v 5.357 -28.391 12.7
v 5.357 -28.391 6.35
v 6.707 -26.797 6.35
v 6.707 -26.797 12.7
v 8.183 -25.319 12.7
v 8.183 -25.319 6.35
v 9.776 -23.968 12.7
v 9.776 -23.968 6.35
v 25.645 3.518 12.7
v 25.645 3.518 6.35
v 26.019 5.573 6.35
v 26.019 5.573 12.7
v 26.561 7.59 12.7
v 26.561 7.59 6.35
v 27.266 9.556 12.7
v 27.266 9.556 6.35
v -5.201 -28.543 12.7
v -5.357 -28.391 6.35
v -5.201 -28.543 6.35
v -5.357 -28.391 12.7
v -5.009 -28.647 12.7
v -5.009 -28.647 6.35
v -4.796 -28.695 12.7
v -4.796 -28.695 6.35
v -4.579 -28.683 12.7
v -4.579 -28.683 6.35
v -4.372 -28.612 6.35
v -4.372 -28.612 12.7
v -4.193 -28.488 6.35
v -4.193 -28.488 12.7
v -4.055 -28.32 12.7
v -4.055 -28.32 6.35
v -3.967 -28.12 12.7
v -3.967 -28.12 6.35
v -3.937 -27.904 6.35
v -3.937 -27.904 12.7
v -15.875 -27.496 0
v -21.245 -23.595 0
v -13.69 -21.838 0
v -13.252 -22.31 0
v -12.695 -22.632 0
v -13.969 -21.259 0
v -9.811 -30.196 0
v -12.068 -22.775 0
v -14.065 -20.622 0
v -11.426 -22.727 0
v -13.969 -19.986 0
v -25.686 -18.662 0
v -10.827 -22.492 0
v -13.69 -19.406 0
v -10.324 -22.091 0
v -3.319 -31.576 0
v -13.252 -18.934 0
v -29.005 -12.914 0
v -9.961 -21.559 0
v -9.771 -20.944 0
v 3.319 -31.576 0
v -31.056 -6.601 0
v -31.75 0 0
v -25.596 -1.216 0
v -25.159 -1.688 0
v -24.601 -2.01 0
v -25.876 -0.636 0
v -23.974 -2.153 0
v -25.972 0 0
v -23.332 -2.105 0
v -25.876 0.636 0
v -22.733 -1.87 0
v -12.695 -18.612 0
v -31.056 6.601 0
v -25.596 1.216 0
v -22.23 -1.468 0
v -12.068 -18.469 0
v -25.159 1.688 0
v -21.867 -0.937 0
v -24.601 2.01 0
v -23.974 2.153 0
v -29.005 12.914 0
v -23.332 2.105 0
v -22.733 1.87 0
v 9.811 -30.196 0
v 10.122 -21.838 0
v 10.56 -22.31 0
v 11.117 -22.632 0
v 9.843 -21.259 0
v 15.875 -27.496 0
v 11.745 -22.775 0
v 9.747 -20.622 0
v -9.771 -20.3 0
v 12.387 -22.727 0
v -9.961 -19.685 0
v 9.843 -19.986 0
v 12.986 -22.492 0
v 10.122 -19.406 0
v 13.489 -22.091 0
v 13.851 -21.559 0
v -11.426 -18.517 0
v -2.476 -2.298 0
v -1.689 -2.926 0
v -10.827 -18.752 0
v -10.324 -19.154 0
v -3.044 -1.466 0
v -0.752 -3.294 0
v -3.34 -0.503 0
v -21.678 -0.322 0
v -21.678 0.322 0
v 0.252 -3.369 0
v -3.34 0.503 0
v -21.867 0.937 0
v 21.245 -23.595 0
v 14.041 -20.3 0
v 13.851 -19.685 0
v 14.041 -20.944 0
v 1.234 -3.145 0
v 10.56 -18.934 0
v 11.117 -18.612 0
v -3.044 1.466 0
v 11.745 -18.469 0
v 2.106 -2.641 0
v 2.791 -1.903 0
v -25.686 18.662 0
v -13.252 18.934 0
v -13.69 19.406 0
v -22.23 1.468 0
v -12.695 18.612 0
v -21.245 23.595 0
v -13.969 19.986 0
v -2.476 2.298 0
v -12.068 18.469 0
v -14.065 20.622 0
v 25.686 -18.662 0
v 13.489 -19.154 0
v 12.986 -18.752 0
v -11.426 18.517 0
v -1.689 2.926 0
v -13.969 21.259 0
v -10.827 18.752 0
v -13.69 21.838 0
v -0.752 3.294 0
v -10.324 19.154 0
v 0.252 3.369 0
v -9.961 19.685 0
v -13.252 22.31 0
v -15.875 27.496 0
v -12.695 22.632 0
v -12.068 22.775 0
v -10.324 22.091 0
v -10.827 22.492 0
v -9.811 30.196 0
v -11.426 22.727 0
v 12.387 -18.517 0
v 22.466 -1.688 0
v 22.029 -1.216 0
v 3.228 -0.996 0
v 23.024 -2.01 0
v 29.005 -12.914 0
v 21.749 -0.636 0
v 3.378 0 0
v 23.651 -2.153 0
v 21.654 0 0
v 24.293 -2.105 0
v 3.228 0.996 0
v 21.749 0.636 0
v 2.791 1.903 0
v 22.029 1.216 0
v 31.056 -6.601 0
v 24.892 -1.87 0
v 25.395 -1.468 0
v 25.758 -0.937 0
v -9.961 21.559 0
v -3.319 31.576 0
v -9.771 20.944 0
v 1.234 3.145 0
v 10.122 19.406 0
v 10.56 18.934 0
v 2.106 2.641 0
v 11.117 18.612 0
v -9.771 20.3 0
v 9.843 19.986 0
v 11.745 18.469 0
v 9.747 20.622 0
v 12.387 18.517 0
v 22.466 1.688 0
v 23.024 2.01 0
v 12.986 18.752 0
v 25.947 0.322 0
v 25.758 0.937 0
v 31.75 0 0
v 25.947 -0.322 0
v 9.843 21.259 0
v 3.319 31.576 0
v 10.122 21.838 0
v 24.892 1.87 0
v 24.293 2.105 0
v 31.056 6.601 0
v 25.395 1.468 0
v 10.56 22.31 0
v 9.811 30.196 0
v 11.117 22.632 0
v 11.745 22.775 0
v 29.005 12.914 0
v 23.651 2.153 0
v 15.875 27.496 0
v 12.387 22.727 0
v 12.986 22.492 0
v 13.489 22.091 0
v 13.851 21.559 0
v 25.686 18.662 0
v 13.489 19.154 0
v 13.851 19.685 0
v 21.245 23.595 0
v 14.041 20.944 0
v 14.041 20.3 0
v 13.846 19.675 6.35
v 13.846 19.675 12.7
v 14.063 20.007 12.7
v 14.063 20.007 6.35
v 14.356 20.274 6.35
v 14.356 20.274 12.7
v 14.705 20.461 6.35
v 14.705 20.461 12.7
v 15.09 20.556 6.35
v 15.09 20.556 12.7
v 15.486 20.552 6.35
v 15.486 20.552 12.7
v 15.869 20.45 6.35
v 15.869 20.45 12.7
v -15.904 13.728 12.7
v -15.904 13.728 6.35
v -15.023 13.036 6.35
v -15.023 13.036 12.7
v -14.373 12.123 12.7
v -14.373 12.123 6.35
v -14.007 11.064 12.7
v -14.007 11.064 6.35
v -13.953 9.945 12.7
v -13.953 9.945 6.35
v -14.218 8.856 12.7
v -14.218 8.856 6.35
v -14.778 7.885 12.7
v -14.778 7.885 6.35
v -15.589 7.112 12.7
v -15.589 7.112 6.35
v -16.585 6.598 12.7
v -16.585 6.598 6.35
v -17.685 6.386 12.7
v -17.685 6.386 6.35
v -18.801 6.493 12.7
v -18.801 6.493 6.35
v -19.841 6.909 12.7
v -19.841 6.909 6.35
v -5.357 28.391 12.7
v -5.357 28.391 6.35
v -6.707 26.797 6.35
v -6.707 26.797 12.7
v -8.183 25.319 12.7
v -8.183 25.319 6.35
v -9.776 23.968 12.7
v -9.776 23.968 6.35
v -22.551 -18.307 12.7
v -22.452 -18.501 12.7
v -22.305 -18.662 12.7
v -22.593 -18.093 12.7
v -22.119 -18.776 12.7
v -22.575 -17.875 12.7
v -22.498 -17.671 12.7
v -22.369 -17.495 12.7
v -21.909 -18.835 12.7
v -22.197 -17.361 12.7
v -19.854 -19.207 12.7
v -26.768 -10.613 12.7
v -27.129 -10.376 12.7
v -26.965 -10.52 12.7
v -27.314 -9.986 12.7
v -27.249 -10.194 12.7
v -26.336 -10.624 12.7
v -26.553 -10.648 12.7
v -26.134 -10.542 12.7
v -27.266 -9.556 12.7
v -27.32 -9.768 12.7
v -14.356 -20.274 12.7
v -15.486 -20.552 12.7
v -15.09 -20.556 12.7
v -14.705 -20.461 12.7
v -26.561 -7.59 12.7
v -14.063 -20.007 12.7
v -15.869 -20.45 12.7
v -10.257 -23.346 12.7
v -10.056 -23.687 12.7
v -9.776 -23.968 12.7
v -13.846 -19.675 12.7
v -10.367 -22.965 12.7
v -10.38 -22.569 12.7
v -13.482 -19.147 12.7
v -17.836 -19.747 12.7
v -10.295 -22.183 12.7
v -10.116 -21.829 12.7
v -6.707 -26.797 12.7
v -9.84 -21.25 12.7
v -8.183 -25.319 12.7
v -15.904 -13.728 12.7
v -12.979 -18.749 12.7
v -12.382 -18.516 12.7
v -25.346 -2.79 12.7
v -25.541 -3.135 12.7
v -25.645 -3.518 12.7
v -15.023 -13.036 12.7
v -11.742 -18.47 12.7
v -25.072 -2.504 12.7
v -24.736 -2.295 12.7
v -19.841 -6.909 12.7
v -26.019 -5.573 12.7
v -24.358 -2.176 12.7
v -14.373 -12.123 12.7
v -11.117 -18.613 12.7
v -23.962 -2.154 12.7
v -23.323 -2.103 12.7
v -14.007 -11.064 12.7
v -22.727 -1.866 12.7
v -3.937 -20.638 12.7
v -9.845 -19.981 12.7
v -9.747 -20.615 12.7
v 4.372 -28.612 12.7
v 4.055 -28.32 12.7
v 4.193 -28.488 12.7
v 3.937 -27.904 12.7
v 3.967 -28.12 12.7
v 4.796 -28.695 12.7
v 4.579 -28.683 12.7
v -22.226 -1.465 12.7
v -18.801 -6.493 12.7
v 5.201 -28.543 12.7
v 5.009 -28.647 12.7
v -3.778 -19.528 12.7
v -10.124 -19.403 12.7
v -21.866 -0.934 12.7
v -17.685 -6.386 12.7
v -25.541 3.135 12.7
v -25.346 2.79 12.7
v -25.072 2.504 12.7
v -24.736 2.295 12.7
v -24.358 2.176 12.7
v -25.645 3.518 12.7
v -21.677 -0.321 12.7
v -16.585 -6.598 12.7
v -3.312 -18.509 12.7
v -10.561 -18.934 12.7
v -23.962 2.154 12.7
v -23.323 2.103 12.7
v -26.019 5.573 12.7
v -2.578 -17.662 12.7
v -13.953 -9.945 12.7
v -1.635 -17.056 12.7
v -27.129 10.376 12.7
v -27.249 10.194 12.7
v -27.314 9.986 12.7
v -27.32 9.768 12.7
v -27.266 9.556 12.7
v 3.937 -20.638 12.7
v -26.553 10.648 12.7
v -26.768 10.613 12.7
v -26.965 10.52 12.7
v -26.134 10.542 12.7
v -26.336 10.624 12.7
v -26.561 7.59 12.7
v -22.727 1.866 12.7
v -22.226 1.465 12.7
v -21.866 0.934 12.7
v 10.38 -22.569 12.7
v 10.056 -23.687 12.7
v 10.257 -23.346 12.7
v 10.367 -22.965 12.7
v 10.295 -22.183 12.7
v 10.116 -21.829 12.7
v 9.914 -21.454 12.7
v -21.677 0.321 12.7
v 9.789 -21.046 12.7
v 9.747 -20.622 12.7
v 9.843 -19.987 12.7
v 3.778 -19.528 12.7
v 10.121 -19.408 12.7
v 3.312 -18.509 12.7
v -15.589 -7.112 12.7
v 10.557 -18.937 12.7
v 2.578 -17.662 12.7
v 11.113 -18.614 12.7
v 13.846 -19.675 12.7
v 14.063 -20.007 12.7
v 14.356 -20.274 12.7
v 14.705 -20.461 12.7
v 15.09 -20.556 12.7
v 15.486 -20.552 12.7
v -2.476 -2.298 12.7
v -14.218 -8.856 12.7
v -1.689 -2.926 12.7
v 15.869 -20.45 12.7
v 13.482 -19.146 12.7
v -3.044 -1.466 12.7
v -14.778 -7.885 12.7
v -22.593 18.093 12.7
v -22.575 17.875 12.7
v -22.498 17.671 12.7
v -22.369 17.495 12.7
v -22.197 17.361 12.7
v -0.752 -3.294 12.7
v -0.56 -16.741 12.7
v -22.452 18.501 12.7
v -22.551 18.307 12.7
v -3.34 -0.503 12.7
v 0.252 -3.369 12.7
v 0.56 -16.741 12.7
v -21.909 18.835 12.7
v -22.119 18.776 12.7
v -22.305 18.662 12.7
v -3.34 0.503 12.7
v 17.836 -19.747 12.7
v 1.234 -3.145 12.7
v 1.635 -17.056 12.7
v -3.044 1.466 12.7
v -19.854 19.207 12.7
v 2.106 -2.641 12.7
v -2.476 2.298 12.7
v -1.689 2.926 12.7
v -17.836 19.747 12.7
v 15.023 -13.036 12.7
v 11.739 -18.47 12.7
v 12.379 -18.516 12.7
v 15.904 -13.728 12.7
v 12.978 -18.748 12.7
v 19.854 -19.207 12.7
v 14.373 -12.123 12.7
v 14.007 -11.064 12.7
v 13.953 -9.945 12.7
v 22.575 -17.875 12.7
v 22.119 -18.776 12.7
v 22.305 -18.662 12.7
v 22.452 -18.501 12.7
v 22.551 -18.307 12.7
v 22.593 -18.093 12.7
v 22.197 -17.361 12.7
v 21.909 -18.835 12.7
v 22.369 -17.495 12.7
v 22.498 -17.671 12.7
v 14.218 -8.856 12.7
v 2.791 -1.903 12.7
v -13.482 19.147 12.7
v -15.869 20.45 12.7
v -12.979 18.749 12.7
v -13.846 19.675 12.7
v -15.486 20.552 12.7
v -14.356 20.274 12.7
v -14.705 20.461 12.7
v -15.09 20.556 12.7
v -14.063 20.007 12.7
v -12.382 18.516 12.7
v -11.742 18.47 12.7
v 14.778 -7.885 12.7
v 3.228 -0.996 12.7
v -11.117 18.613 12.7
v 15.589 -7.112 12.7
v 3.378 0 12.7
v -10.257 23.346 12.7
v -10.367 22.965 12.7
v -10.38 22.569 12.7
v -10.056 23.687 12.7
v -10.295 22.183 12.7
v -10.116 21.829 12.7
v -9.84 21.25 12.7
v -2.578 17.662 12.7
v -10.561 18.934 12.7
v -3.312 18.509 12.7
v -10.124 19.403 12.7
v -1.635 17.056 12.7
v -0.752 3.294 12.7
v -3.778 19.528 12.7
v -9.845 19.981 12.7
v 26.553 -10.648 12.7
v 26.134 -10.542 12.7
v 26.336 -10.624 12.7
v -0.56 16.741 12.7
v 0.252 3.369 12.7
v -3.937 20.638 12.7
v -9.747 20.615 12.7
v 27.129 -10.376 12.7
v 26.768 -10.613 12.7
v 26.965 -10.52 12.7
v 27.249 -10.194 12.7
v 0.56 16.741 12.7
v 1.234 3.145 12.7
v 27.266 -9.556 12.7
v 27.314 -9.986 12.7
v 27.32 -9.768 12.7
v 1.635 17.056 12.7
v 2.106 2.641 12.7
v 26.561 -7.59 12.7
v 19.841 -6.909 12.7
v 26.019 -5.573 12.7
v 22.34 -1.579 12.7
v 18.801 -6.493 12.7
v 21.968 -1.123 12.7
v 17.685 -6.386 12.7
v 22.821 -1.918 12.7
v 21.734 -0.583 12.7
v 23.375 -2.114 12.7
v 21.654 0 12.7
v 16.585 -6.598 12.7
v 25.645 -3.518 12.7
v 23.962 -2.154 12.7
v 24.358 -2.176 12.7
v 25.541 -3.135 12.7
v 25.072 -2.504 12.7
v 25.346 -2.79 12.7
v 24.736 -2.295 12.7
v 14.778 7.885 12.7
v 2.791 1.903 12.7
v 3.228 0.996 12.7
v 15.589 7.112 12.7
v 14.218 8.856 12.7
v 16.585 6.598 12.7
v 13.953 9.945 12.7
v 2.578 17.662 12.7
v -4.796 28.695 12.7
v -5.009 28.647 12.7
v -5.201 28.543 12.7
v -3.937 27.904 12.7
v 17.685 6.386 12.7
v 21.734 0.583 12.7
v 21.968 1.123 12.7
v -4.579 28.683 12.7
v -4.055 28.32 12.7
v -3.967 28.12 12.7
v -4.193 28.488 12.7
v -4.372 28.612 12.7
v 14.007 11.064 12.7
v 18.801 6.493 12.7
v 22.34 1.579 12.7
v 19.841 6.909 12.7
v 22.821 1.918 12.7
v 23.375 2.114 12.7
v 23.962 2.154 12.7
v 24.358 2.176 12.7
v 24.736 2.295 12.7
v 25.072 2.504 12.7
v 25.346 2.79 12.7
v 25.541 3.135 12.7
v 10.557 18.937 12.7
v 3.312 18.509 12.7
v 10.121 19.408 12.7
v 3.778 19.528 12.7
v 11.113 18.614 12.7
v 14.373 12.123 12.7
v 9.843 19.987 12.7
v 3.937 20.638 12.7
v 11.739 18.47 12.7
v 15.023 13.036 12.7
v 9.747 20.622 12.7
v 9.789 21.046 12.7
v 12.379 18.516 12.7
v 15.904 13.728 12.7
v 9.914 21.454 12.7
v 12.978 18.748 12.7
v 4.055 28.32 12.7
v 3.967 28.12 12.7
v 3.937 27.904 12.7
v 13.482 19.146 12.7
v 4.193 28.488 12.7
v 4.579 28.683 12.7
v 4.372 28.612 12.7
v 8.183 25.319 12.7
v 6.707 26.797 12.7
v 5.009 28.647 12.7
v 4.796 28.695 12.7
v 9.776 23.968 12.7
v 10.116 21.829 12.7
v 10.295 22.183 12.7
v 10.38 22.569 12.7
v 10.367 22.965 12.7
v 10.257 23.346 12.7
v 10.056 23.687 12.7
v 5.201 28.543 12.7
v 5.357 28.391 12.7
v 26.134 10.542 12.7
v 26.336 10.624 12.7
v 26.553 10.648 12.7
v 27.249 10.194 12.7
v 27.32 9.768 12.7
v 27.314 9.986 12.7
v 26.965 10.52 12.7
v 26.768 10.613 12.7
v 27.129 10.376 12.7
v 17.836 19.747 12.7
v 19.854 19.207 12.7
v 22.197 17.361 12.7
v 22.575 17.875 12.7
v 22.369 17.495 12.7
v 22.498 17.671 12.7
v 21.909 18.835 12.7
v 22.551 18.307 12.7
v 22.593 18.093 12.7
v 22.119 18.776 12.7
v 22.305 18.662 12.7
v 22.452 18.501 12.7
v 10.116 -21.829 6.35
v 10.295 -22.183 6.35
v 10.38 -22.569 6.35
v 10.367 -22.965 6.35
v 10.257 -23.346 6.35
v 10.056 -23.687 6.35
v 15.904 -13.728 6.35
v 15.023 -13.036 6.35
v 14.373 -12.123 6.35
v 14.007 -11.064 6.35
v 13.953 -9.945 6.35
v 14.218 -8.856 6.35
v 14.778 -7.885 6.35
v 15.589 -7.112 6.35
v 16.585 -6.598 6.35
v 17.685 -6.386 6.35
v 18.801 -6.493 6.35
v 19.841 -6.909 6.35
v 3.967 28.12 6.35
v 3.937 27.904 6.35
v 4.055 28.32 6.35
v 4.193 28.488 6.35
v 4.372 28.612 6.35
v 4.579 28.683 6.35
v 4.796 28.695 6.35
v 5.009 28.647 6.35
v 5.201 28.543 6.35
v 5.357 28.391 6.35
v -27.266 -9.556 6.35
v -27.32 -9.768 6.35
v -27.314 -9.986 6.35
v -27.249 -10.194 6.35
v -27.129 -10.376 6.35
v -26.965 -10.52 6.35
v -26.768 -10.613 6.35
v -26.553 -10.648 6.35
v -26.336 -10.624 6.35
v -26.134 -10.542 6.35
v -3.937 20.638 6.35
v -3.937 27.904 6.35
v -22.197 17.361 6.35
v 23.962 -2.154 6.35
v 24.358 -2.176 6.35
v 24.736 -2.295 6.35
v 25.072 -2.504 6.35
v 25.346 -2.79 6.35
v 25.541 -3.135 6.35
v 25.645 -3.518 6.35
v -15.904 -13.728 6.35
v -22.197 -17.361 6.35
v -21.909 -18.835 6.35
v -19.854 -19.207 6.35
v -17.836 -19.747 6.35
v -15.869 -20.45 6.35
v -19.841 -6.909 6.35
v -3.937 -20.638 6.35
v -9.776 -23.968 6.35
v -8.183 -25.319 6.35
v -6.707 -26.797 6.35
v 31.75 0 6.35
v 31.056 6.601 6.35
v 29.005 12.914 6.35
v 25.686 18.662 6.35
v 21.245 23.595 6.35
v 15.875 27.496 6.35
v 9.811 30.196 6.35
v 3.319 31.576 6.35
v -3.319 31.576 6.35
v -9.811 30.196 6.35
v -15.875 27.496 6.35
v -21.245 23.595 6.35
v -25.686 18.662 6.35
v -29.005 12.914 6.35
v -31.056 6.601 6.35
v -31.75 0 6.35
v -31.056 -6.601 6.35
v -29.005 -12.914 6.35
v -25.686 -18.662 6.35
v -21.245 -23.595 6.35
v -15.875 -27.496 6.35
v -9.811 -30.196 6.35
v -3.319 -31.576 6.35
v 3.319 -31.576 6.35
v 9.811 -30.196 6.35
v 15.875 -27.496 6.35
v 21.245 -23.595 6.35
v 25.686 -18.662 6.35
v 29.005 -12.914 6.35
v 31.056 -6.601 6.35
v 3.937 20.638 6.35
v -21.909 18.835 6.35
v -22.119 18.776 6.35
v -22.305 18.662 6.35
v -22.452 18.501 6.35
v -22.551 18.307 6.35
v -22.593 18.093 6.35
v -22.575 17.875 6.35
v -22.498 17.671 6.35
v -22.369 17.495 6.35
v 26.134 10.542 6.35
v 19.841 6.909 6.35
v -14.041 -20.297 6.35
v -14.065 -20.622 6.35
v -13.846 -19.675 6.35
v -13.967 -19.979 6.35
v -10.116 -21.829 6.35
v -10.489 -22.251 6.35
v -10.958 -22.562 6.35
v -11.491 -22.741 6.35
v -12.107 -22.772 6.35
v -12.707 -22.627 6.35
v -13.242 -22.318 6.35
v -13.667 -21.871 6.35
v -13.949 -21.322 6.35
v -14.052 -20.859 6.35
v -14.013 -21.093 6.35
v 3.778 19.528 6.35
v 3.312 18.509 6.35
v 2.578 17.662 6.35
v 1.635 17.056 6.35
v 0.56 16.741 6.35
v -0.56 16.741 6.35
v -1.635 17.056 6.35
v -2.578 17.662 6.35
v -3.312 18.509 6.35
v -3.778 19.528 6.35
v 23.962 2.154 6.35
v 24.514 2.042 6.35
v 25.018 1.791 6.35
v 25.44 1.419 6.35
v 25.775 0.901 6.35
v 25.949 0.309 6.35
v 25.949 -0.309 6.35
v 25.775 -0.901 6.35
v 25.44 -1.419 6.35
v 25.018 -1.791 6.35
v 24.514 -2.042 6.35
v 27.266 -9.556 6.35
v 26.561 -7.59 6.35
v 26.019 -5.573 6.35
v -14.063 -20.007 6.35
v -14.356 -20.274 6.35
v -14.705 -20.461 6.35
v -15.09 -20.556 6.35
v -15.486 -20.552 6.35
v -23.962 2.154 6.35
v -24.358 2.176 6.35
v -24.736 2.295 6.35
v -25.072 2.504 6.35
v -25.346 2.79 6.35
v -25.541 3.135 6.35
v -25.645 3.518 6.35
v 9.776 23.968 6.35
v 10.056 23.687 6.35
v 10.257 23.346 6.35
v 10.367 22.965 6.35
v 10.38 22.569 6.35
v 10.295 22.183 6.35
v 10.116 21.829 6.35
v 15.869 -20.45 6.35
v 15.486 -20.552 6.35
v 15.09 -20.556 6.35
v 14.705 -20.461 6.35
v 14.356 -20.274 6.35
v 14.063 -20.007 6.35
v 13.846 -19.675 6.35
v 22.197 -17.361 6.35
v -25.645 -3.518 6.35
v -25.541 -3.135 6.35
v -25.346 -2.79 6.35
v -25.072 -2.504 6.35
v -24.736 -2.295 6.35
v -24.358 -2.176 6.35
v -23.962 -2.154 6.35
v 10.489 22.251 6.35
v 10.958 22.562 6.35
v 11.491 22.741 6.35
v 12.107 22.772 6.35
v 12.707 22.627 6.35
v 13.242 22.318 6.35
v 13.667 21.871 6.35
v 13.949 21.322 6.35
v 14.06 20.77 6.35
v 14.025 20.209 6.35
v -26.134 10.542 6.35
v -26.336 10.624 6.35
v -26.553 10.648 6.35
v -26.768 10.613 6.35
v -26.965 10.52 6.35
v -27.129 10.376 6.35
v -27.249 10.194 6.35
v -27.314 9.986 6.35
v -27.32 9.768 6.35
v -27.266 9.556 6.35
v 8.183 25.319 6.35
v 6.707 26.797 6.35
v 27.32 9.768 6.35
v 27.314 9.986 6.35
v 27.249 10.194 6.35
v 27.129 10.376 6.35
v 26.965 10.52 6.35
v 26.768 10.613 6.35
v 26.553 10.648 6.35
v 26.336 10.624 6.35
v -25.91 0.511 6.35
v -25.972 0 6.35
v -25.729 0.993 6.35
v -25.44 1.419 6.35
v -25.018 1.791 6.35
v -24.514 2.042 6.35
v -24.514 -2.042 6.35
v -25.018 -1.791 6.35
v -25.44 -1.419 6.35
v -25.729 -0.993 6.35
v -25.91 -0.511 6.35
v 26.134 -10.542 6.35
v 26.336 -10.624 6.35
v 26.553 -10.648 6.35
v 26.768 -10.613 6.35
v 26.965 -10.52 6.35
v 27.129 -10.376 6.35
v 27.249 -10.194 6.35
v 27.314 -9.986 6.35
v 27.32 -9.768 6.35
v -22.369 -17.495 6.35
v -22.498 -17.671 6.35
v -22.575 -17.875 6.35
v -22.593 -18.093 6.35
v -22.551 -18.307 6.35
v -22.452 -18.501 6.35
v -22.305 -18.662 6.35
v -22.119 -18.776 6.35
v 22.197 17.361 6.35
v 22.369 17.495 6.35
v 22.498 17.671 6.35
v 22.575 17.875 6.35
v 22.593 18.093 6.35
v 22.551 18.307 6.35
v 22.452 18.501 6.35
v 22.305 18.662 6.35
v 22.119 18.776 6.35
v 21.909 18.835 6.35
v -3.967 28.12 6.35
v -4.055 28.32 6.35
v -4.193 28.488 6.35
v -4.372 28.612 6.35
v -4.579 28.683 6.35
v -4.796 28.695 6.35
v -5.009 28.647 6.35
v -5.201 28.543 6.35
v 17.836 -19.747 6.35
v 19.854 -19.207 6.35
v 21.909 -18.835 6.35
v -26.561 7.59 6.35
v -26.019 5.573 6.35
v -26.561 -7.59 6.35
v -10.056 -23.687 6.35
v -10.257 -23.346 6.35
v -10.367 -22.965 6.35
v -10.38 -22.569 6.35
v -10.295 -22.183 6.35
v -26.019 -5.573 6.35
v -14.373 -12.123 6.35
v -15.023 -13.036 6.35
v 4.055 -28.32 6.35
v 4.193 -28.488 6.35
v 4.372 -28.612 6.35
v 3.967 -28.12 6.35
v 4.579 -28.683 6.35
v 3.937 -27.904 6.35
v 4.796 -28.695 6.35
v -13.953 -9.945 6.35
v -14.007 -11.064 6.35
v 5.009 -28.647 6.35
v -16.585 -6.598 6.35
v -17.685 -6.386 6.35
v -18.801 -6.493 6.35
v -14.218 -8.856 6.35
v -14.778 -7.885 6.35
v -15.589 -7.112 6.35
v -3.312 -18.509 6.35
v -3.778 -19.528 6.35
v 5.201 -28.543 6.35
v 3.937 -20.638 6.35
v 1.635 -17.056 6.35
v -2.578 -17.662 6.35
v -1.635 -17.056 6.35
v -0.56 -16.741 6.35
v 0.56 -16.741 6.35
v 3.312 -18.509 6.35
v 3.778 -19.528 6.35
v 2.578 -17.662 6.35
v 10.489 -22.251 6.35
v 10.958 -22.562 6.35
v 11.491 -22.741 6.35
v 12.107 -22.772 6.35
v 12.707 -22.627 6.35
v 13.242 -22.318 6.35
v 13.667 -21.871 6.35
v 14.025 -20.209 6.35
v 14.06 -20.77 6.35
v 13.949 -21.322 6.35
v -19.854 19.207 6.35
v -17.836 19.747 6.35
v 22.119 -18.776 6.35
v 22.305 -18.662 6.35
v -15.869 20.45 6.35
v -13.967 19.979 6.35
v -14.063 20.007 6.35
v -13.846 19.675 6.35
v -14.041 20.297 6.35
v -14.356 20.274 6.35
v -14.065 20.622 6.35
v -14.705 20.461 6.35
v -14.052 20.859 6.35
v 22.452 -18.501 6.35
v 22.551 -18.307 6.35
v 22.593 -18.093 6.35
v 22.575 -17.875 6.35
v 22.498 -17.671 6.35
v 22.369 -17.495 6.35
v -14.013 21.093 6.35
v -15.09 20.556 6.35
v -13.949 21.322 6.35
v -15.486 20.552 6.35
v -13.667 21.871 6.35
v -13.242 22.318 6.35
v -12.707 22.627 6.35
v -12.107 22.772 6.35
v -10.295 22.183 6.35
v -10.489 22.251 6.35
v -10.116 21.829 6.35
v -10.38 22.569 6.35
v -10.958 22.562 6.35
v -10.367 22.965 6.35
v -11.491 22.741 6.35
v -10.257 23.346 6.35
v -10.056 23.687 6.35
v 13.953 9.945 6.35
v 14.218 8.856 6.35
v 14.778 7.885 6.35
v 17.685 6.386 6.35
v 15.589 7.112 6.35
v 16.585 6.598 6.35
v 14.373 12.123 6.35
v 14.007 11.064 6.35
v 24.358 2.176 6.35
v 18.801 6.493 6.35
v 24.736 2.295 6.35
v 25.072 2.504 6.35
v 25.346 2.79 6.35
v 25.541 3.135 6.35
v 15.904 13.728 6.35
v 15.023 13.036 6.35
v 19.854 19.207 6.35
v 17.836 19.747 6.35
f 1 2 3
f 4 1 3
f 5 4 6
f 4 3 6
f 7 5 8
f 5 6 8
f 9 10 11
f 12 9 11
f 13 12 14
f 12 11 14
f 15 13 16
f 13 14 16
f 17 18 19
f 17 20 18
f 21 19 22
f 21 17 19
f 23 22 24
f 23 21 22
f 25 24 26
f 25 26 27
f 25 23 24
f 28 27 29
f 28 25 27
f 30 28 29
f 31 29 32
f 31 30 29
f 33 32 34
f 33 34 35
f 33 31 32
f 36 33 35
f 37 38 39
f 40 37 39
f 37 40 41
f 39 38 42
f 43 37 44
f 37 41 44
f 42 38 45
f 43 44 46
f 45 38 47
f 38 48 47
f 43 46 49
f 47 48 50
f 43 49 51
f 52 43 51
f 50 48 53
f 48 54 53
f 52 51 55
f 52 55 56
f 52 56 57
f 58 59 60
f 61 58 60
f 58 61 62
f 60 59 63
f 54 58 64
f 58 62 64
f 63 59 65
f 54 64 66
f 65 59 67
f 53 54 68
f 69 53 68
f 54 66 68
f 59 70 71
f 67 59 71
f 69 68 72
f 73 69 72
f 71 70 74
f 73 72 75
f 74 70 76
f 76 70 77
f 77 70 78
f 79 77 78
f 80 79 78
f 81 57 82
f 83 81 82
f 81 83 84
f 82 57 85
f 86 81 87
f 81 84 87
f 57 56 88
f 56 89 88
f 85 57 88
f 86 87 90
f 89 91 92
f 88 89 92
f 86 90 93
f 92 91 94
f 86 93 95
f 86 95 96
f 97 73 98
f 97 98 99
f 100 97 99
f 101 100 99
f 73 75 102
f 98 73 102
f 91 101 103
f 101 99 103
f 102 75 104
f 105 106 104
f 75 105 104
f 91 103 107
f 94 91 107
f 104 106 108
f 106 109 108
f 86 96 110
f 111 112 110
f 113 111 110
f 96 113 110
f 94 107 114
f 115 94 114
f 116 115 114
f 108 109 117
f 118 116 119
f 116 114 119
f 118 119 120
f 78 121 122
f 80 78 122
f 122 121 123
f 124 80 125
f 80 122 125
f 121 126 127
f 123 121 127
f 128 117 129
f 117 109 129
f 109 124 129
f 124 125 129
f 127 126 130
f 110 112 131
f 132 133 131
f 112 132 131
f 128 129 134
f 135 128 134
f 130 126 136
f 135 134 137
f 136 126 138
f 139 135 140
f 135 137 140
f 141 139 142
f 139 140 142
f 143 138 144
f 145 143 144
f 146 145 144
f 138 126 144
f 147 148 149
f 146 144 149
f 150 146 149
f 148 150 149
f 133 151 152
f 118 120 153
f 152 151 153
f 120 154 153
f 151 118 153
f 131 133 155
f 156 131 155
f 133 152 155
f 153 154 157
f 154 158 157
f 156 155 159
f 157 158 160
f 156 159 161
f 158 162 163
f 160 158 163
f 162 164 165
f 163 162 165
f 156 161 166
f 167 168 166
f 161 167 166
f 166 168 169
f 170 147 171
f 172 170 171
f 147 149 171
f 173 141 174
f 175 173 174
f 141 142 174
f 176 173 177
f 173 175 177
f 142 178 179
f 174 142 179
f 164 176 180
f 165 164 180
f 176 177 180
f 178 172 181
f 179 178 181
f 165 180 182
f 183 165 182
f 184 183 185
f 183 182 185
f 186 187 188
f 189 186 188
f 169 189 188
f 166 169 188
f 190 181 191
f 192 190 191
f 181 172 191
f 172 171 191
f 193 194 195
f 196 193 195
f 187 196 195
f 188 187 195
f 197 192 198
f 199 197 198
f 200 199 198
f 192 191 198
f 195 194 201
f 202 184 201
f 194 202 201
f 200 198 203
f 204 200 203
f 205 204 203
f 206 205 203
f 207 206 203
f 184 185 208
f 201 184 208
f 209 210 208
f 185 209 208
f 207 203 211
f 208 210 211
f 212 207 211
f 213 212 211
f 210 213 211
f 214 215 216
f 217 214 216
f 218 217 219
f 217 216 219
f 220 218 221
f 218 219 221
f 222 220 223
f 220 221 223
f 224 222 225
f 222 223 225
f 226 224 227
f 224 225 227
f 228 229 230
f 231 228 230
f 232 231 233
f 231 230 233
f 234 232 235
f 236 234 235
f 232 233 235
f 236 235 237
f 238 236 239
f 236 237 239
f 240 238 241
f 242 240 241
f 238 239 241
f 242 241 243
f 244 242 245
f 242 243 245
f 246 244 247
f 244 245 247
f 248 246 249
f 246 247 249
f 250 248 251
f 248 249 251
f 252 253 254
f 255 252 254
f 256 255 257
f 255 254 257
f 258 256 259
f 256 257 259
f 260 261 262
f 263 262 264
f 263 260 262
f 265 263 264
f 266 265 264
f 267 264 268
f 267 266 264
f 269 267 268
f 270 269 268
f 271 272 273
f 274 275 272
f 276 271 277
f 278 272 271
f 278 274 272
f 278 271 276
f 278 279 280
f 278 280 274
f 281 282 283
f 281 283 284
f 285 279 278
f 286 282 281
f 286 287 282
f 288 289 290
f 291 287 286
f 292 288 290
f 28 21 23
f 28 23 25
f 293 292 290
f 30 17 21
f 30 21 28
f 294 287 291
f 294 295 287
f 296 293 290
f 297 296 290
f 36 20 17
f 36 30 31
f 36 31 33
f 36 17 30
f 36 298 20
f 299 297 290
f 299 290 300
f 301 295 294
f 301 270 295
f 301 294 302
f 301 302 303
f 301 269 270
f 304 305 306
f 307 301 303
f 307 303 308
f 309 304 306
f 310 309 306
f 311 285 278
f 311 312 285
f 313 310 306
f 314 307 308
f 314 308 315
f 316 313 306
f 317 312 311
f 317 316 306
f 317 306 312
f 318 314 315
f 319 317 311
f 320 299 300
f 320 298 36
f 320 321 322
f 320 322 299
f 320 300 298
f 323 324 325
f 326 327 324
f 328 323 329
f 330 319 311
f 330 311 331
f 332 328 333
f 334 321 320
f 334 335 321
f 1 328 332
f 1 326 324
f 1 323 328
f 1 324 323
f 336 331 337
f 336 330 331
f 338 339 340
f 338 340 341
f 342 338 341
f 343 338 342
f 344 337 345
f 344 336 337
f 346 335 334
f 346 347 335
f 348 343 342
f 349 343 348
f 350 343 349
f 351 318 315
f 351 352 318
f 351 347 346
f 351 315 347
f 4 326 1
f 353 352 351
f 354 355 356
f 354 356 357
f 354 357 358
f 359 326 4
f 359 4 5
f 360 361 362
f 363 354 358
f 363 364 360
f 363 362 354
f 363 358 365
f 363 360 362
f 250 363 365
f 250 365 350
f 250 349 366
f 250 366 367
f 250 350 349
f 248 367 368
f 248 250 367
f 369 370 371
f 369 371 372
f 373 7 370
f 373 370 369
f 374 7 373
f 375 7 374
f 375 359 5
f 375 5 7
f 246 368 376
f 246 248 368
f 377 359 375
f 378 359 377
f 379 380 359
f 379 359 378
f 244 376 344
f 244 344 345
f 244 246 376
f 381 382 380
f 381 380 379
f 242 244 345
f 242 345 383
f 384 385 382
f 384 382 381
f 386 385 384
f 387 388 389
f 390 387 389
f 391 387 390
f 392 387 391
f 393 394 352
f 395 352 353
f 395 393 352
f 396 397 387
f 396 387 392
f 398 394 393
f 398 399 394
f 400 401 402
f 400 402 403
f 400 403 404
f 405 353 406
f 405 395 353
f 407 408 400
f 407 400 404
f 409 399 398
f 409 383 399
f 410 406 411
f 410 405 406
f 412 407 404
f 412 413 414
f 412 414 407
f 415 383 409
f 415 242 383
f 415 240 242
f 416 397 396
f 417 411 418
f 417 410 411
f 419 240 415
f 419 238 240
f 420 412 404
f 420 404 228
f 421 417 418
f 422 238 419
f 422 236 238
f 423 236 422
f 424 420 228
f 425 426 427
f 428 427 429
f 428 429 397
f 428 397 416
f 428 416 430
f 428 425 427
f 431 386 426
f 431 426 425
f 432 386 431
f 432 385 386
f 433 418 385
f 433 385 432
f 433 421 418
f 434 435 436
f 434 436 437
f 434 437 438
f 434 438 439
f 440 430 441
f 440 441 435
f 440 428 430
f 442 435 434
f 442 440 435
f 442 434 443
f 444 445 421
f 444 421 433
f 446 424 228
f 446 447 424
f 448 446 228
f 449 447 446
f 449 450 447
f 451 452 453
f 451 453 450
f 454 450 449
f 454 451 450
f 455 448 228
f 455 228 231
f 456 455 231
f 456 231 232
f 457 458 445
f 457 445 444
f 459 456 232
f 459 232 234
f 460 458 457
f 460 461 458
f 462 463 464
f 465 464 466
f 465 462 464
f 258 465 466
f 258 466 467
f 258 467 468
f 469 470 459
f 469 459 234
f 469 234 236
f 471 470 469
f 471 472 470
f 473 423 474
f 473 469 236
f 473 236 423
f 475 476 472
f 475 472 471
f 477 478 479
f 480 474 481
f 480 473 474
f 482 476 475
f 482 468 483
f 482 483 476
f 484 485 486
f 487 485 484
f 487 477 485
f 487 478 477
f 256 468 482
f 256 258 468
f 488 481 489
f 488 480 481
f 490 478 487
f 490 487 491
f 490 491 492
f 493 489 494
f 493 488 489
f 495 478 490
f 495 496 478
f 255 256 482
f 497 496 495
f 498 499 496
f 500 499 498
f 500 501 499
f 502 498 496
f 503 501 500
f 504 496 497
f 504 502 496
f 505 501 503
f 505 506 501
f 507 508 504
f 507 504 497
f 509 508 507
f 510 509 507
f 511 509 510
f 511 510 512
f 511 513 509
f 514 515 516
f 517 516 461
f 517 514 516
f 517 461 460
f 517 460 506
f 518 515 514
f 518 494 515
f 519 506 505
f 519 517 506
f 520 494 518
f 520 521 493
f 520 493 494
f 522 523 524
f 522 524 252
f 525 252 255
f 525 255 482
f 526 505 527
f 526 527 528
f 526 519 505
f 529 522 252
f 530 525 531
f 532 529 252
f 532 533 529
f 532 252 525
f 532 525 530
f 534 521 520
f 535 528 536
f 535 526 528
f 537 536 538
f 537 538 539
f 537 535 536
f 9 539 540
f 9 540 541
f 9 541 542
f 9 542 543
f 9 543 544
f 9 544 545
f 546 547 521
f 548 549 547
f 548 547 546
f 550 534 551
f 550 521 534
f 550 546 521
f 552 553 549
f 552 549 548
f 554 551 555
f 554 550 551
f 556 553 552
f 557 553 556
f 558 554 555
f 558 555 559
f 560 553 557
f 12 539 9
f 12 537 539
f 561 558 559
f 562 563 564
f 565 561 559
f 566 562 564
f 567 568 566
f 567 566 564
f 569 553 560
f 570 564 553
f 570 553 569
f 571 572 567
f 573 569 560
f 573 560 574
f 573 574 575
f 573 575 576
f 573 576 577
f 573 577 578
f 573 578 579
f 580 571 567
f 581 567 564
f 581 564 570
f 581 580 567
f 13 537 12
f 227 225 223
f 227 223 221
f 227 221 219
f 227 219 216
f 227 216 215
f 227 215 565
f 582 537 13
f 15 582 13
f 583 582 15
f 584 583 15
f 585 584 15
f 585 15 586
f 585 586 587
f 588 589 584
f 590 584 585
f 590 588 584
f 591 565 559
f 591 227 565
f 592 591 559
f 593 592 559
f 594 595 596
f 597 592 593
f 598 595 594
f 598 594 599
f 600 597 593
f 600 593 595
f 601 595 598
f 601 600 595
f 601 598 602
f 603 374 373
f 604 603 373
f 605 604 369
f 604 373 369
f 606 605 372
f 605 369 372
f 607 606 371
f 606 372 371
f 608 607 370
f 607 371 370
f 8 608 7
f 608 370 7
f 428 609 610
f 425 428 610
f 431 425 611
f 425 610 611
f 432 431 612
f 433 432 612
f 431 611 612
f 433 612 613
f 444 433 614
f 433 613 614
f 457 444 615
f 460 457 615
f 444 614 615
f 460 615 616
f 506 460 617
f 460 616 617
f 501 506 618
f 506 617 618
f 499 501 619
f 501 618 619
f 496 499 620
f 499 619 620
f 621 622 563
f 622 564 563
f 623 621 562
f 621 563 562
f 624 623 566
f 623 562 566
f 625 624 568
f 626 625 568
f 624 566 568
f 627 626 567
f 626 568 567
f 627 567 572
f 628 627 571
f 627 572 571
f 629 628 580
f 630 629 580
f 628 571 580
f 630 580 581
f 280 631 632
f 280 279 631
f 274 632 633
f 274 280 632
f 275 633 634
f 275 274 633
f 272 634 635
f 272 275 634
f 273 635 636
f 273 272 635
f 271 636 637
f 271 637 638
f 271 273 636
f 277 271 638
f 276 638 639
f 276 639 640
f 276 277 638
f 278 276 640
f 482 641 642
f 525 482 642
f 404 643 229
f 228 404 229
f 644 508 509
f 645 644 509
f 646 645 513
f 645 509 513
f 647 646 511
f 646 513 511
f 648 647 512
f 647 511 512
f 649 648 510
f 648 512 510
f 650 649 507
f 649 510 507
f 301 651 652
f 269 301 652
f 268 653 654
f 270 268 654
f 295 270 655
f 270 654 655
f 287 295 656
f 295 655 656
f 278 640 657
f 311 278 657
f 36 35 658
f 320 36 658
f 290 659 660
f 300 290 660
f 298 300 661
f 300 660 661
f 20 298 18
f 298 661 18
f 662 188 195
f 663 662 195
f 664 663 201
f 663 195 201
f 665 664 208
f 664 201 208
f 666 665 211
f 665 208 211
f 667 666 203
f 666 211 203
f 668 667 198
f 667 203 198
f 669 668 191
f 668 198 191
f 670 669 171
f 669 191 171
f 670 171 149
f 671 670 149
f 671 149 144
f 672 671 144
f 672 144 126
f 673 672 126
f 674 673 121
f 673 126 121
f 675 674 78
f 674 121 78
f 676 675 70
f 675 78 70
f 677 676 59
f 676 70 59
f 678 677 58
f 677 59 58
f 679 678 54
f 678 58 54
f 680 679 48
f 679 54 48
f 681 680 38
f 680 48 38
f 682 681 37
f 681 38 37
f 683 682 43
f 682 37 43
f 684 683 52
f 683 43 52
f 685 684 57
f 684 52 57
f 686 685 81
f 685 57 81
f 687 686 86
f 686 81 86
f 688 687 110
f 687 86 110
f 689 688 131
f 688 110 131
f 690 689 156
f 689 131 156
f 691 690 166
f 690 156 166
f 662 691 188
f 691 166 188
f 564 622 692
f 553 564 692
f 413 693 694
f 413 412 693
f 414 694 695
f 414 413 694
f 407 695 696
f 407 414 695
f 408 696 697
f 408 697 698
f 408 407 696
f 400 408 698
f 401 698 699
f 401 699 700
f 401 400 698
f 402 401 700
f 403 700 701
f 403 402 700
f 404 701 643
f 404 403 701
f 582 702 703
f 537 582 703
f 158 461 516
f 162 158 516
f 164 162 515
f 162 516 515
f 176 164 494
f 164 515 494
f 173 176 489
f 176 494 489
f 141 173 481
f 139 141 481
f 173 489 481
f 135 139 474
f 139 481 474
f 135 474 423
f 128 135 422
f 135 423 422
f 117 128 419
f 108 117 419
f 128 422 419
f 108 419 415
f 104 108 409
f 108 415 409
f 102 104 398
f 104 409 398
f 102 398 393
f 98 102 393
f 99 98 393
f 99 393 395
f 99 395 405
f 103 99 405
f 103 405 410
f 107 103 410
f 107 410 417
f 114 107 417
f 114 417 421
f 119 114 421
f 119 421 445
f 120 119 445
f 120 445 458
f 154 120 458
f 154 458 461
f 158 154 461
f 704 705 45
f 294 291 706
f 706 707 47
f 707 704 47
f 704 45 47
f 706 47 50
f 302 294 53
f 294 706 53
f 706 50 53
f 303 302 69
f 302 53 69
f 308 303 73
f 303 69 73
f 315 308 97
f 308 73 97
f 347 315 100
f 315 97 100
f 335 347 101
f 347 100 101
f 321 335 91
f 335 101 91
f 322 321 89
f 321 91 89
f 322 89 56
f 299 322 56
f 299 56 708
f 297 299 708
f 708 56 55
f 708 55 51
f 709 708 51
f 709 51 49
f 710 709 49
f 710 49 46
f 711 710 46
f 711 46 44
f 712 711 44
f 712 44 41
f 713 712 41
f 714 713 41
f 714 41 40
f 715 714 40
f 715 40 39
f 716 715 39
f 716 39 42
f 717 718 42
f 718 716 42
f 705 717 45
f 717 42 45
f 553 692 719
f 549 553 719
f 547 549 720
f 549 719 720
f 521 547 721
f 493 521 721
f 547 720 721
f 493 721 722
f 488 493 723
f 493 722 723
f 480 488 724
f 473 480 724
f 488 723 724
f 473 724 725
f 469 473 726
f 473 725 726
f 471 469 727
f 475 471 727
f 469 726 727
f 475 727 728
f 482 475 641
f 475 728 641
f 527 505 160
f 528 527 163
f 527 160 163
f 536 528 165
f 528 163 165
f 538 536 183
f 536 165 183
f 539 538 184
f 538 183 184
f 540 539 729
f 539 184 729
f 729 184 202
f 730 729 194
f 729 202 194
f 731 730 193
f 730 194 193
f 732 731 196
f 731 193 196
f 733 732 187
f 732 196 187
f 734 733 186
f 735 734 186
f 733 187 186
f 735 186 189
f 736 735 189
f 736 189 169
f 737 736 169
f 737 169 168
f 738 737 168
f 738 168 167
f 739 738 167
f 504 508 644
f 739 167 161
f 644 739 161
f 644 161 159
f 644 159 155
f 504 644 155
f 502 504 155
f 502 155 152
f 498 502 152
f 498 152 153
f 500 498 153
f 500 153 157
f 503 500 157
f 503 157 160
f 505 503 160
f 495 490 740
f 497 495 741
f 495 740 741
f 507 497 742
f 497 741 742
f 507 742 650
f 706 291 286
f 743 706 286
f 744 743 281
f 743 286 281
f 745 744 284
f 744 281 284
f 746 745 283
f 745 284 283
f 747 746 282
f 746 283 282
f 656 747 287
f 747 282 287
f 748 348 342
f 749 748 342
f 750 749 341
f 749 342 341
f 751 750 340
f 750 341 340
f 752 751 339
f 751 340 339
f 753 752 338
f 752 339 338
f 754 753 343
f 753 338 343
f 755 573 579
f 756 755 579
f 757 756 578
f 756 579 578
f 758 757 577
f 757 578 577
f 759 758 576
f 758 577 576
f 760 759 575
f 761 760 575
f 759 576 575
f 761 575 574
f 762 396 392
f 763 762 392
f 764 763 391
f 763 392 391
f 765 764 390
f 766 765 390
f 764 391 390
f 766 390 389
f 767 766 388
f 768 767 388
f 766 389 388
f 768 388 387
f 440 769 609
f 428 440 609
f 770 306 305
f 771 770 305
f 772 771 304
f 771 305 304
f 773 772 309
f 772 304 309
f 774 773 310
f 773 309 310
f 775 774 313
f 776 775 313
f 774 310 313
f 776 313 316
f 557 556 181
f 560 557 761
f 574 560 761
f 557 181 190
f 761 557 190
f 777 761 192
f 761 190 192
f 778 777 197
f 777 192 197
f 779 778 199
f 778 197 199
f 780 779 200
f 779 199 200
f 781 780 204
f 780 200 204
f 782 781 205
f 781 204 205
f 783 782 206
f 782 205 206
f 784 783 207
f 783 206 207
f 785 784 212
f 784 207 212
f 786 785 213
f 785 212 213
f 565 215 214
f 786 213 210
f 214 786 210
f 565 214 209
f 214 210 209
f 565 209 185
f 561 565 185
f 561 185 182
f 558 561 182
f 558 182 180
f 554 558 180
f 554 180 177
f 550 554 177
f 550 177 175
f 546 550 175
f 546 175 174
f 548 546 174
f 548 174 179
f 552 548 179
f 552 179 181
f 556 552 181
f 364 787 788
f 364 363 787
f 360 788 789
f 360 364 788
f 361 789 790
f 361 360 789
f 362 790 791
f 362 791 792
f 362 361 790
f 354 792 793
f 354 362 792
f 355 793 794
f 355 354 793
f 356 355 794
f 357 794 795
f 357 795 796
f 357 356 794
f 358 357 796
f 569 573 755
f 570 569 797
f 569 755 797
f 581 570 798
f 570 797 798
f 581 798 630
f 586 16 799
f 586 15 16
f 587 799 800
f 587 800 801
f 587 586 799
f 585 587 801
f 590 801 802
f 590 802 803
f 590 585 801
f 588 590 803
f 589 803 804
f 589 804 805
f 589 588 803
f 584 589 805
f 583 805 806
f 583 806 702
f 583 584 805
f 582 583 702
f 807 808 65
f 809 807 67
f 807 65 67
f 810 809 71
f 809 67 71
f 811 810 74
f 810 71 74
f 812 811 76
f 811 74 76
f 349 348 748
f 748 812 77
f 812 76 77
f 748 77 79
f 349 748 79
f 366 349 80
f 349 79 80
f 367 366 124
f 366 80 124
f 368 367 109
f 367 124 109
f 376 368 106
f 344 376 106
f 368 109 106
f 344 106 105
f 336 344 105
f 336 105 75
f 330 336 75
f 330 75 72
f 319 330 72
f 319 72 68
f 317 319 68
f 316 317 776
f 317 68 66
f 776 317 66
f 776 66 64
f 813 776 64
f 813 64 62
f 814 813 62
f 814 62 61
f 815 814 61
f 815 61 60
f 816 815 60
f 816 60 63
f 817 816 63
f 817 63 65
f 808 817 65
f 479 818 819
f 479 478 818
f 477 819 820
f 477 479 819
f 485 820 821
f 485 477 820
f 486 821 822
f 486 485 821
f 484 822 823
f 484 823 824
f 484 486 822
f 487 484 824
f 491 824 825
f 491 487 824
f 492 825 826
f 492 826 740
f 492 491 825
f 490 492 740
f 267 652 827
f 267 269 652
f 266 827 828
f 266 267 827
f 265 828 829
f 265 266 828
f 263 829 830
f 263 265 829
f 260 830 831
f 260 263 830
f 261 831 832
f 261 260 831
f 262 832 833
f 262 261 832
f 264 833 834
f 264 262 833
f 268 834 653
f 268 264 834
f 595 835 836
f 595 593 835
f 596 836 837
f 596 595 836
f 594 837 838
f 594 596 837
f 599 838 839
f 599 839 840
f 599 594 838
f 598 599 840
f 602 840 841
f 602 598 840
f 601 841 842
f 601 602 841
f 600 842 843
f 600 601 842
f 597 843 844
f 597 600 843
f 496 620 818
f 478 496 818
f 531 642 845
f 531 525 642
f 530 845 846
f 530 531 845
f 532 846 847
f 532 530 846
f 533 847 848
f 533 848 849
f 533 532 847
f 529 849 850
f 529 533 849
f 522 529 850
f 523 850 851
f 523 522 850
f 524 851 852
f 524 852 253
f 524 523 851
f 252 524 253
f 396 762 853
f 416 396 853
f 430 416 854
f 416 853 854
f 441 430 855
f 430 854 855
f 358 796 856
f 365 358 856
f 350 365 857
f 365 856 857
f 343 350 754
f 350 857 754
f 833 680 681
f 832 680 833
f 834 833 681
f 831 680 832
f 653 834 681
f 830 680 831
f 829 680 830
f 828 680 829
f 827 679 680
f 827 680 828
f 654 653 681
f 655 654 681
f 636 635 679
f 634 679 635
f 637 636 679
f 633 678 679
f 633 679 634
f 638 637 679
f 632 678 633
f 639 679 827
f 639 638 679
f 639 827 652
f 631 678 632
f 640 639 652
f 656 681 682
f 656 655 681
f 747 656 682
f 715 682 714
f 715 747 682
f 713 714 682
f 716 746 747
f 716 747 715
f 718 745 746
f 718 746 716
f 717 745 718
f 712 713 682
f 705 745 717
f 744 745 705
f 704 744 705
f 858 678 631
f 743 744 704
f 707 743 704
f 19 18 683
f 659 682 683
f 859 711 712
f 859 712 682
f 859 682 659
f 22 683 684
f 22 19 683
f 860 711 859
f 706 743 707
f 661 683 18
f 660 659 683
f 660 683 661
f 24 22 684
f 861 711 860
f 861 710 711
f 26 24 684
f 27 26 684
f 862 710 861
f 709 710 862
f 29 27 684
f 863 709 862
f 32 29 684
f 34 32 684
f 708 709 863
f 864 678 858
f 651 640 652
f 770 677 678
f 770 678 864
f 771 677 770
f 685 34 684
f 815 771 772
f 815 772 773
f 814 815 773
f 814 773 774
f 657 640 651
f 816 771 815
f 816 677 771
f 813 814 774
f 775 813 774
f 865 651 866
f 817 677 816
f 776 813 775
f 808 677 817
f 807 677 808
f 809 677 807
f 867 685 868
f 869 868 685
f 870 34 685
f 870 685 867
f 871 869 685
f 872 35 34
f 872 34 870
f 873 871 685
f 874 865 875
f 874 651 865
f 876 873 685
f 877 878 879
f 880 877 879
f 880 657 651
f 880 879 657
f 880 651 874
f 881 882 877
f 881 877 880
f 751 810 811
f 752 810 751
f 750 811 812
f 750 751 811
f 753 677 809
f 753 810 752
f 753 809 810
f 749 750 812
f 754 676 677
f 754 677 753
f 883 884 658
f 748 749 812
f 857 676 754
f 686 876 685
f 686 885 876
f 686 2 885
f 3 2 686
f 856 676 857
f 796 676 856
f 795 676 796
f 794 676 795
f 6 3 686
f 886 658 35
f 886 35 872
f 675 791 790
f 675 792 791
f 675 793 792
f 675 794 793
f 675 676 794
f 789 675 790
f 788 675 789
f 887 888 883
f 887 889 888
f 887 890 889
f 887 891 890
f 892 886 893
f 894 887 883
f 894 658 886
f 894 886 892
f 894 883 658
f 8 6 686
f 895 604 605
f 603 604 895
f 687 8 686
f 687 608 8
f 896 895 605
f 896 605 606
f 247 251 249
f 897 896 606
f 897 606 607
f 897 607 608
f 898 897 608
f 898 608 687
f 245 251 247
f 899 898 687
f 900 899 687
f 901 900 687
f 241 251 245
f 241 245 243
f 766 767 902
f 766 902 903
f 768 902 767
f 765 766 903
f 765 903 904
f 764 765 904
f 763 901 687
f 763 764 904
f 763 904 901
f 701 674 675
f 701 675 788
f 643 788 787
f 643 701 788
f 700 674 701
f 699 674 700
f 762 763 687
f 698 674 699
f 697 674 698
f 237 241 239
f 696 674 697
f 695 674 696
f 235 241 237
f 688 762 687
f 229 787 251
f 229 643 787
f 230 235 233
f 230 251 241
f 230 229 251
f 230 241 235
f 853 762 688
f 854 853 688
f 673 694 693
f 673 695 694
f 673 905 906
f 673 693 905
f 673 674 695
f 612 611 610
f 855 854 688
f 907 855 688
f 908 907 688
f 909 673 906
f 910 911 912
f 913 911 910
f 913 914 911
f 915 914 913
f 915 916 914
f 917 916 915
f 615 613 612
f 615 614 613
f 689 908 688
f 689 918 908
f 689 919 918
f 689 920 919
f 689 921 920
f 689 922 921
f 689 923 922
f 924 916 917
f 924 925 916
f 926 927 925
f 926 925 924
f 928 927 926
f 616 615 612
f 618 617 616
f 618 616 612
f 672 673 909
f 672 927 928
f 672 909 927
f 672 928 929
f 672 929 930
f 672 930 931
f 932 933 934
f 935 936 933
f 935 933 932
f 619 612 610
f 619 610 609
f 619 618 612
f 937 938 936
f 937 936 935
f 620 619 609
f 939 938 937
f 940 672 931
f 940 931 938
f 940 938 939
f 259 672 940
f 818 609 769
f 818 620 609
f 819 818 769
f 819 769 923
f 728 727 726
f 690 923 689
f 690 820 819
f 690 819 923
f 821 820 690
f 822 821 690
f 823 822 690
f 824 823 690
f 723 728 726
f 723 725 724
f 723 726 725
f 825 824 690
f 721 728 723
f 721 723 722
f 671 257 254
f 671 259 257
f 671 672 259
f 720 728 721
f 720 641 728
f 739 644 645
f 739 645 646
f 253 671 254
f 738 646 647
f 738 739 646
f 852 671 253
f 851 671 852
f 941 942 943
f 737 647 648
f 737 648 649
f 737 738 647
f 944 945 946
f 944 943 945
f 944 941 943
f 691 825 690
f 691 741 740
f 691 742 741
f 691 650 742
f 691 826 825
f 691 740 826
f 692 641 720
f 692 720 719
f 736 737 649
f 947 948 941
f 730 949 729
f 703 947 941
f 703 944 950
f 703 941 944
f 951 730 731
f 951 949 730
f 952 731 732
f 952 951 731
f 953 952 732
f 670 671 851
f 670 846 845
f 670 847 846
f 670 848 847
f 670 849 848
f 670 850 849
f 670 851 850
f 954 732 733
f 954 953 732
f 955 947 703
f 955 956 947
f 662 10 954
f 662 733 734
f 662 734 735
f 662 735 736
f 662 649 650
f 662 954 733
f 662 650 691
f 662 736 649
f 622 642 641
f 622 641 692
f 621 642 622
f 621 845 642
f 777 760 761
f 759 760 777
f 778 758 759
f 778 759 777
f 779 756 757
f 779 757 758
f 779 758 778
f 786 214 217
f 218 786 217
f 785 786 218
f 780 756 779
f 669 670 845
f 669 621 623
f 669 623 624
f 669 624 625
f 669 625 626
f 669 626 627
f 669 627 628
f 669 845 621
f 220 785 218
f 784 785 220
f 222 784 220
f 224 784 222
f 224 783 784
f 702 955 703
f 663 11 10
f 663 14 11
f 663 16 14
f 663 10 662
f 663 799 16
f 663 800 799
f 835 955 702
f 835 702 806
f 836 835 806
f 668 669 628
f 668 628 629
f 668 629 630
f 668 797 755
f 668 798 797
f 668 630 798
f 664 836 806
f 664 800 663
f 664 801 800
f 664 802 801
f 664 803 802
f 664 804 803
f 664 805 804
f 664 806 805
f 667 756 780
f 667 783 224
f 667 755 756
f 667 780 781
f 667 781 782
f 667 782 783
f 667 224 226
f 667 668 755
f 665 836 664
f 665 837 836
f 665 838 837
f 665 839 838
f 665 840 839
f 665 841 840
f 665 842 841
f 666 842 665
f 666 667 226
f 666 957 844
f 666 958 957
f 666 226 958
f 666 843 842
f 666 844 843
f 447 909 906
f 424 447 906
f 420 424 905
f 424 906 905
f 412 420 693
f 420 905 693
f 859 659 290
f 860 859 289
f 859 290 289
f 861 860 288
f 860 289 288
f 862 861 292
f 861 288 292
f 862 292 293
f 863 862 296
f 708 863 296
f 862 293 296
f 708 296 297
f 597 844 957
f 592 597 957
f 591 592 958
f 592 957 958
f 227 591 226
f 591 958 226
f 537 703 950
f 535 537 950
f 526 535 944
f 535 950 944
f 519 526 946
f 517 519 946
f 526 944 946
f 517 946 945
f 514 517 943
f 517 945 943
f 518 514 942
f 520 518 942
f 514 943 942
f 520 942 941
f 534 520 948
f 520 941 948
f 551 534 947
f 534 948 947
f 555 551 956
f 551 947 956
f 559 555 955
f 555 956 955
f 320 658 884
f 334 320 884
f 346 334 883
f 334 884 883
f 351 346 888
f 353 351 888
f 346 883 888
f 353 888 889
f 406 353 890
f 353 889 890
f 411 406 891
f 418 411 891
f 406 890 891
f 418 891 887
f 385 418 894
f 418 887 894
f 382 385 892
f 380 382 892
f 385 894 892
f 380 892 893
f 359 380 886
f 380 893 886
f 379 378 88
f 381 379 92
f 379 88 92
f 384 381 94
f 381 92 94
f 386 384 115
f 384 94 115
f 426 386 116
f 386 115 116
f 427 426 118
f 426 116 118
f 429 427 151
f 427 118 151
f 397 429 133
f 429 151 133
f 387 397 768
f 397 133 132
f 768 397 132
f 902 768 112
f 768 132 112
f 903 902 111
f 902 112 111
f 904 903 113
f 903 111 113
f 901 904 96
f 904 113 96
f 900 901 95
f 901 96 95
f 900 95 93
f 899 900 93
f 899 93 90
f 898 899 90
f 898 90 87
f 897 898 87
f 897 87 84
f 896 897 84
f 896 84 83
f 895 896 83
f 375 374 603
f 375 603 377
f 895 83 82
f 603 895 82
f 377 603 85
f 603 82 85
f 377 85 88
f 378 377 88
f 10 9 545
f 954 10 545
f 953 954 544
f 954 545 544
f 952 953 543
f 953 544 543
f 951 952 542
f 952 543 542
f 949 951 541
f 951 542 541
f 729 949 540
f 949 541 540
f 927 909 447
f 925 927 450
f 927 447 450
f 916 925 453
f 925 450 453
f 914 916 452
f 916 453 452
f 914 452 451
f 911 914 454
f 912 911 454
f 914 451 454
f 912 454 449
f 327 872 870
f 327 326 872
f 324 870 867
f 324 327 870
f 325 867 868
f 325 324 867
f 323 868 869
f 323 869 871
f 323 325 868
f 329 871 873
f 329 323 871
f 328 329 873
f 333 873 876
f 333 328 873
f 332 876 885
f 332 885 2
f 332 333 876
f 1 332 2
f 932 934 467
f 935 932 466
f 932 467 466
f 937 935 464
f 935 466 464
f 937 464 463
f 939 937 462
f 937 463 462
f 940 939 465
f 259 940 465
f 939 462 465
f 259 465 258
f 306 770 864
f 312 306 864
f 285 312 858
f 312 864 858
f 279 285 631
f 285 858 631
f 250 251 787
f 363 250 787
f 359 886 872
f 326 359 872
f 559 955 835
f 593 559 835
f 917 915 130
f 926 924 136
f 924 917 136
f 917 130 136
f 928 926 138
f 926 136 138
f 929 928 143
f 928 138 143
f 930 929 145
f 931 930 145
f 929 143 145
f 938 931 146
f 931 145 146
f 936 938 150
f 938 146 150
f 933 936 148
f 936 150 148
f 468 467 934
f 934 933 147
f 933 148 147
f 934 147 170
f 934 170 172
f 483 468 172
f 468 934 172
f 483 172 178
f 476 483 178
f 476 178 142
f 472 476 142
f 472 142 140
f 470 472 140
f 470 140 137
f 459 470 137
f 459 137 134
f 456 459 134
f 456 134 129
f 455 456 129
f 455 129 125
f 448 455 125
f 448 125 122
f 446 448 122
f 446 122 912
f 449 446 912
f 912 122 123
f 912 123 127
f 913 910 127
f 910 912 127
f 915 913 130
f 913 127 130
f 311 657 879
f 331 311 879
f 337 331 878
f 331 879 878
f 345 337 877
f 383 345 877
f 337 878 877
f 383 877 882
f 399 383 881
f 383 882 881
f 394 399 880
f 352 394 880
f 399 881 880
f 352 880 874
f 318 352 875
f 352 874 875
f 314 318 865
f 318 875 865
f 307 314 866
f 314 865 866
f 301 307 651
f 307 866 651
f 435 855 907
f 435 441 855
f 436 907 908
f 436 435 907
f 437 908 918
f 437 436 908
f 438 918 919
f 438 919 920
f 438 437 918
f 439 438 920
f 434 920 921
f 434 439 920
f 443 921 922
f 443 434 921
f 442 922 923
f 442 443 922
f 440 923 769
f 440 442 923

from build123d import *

# Parameters (mm, degrees)
SKETCH2_R           = 31.75
BOSS_EXTRUDE1_DEPTH = 6.35
BOSS_EXTRUDE2_DEPTH = 6.35
SKETCH4_R           = 3.3782
CUT_EXTRUDE1_DEPTH  = 47.6627796
FILLET2_R           = 0.79375
SKETCH5_R           = 2.159
CUT_EXTRUDE2_DEPTH  = 47.6627796
FILLET3_R           = 1.5875


with BuildPart() as part:
    # Sketch2 → Boss-Extrude1 (new body)
    with BuildSketch(Plane.XY):
        Circle(SKETCH2_R)
    extrude(amount=BOSS_EXTRUDE1_DEPTH)

    # Sketch3 → Boss-Extrude2 (add)
    with BuildSketch(Plane.XY.offset(6.35)):
        with BuildLine():
            Line((3.937, 30.411026388), (3.937, 20.6375))
            ThreePointArc((3.937, 20.6375), (0, 16.7005), (-3.937, 20.6375))
            Line((-3.937, 20.6375), (-3.937, 30.411026388))
            ThreePointArc((-3.937, 30.411026388), (-12.7, 21.997045256), (-24.368221407, 18.615055209))
            Line((-24.368221407, 18.615055209), (-15.904099271, 13.728292015))
            ThreePointArc((-15.904099271, 13.728292015), (-14.463057256, 8.35025), (-19.841099271, 6.909207985))
            Line((-19.841099271, 6.909207985), (-28.305221407, 11.795971179))
            ThreePointArc((-28.305221407, 11.795971179), (-25.4, 0), (-28.305221407, -11.795971179))
            Line((-28.305221407, -11.795971179), (-19.841099271, -6.909207985))
            ThreePointArc((-19.841099271, -6.909207985), (-14.463057256, -8.35025), (-15.904099271, -13.728292015))
            Line((-15.904099271, -13.728292015), (-24.368221407, -18.615055209))
            ThreePointArc((-24.368221407, -18.615055209), (-12.7, -21.997045256), (-3.937, -30.411026388))
            Line((-3.937, -30.411026388), (-3.937, -20.6375))
            ThreePointArc((-3.937, -20.6375), (0, -16.7005), (3.937, -20.6375))
            Line((3.937, -20.6375), (3.937, -30.411026388))
            ThreePointArc((3.937, -30.411026388), (12.7, -21.997045256), (24.368221407, -18.615055209))
            Line((24.368221407, -18.615055209), (15.904099271, -13.728292015))
            ThreePointArc((15.904099271, -13.728292015), (14.463057256, -8.35025), (19.841099271, -6.909207985))
            Line((19.841099271, -6.909207985), (28.305221407, -11.795971179))
            ThreePointArc((28.305221407, -11.795971179), (25.4, 0), (28.305221407, 11.795971179))
            Line((28.305221407, 11.795971179), (19.841099271, 6.909207985))
            ThreePointArc((19.841099271, 6.909207985), (14.463057256, 8.35025), (15.904099271, 13.728292015))
            Line((15.904099271, 13.728292015), (24.368221407, 18.615055209))
            ThreePointArc((24.368221407, 18.615055209), (12.7, 21.997045256), (3.937, 30.411026388))
        make_face()
    extrude(amount=BOSS_EXTRUDE2_DEPTH)

    # Sketch4 → Cut-Extrude1 (cut, through all)
    with BuildSketch(Plane.XY.offset(12.7)):
        Circle(SKETCH4_R)
    extrude(amount=-CUT_EXTRUDE1_DEPTH, mode=Mode.SUBTRACT)

    # Fillet2
    fillet2_edges = [part.edges().sort_by_distance(p)[0] for p in [
        (-28.305221407, 11.795971179, 9.525),
        (-28.305221407, -11.795971179, 9.525),
        (-24.368221407, -18.615055209, 9.525),
        (-3.937, -30.411026388, 9.525),
        (3.937, -30.411026388, 9.525),
        (24.368221407, -18.615055209, 9.525),
        (28.305221407, -11.795971179, 9.525),
        (28.305221407, 11.795971179, 9.525),
        (24.368221407, 18.615055209, 9.525),
        (3.937, 30.411026388, 9.525),
        (-3.937, 30.411026388, 9.525),
        (-24.368221407, 18.615055209, 9.525),
    ]]
    fillet(fillet2_edges, radius=FILLET2_R)

    # Sketch5 → Cut-Extrude2 (cut, through all)
    with BuildSketch(Plane(origin=(0, 0, 0), x_dir=(-1, 0, 0), z_dir=(0, 0, -1))):
        with Locations((-11.90625, 20.622229928)):
            Circle(SKETCH5_R)
        with Locations((11.90625, 20.622229928)):
            Circle(SKETCH5_R)
        with Locations((23.8125, 0)):
            Circle(SKETCH5_R)
        with Locations((11.90625, -20.622229928)):
            Circle(SKETCH5_R)
        with Locations((-11.90625, -20.622229928)):
            Circle(SKETCH5_R)
        with Locations((-23.8125, 0)):
            Circle(SKETCH5_R)
    extrude(amount=-CUT_EXTRUDE2_DEPTH, mode=Mode.SUBTRACT)

    # Fillet3
    # the kernel refuses this fillet: 1.5875 mm, written as the material it takes off along each edge
    with BuildSketch(Plane(origin=(25.439668824, 1.419014665, 17.971488678), x_dir=(-0.895364972347459, 0.44533309588804865, 0), z_dir=(0, 0, -1)), Plane(origin=(13.94873716, -21.321892132, 17.971488678), x_dir=(-0.062012711988979966, 0.9980753596556584, 0), z_dir=(0, 0, -1)), Plane(origin=(-11.490931663, -22.740906798, 17.971488678), x_dir=(0.8333522603583425, 0.5527422637682424, 0), z_dir=(0, 0, -1)), Plane(origin=(-25.439668824, -1.419014665, 17.971488678), x_dir=(0.895364972347876, -0.44533309588721026, 0), z_dir=(0, 0, -1)), Plane(origin=(-13.94873716, 21.321892132, 17.971488678), x_dir=(0.06201271198937459, -0.998075359655634, 0), z_dir=(0, 0, -1)), Plane(origin=(11.490931663, 22.740906798, 17.971488678), x_dir=(-0.8333522603586354, -0.552742263767801, 0), z_dir=(0, 0, -1))) as fillet3_piece_1:
        with BuildLine():
            CenterArc((2.256551384, 1.467035409), FILLET3_R, 161.515751163, 86.019798363)
            ThreePointArc((0.75094916, 1.970342665), (0.395929534, 0.977375414), (0, 0))
            ThreePointArc((0, 0), (0.824975775, 0.163831844), (1.64995155, 0))
        make_face()
    extrude(amount=11.621488678, mode=Mode.SUBTRACT)
    with BuildSketch(Plane(origin=(25.439668824, -1.419014665, 17.971488678), x_dir=(0.09726153154123053, -0.9952588580275255, 0), z_dir=(0, 0, -1)), Plane(origin=(11.490931663, -22.740906798, 17.971488678), x_dir=(-0.8132886886226861, -0.581860386139486, 0), z_dir=(0, 0, -1)), Plane(origin=(-13.94873716, -21.321892132, 17.971488678), x_dir=(-0.9105502201639705, 0.4133984718880138, 0), z_dir=(0, 0, -1)), Plane(origin=(-25.439668824, 1.419014665, 17.971488678), x_dir=(-0.09726153154127945, 0.9952588580275207, 0), z_dir=(0, 0, -1)), Plane(origin=(-11.490931663, 22.740906798, 17.971488678), x_dir=(0.8132886886227111, 0.5818603861394509, 0), z_dir=(0, 0, -1)), Plane(origin=(13.94873716, 21.321892132, 17.971488678), x_dir=(0.9105502201639343, -0.41339847188809375, 0), z_dir=(0, 0, -1))) as fillet3_piece_2:
        with BuildLine():
            CenterArc((2.17448908, 1.586131862), FILLET3_R, 181.601297313, 86.019798363)
            ThreePointArc((0.587609026, 1.541770329), (0.446894509, 0.71253856), (0, 0))
            ThreePointArc((0, 0), (1.054297736, 0.021890215), (2.108595471, 0))
        make_face()
    extrude(amount=11.621488678, mode=Mode.SUBTRACT)


solid = part.part
